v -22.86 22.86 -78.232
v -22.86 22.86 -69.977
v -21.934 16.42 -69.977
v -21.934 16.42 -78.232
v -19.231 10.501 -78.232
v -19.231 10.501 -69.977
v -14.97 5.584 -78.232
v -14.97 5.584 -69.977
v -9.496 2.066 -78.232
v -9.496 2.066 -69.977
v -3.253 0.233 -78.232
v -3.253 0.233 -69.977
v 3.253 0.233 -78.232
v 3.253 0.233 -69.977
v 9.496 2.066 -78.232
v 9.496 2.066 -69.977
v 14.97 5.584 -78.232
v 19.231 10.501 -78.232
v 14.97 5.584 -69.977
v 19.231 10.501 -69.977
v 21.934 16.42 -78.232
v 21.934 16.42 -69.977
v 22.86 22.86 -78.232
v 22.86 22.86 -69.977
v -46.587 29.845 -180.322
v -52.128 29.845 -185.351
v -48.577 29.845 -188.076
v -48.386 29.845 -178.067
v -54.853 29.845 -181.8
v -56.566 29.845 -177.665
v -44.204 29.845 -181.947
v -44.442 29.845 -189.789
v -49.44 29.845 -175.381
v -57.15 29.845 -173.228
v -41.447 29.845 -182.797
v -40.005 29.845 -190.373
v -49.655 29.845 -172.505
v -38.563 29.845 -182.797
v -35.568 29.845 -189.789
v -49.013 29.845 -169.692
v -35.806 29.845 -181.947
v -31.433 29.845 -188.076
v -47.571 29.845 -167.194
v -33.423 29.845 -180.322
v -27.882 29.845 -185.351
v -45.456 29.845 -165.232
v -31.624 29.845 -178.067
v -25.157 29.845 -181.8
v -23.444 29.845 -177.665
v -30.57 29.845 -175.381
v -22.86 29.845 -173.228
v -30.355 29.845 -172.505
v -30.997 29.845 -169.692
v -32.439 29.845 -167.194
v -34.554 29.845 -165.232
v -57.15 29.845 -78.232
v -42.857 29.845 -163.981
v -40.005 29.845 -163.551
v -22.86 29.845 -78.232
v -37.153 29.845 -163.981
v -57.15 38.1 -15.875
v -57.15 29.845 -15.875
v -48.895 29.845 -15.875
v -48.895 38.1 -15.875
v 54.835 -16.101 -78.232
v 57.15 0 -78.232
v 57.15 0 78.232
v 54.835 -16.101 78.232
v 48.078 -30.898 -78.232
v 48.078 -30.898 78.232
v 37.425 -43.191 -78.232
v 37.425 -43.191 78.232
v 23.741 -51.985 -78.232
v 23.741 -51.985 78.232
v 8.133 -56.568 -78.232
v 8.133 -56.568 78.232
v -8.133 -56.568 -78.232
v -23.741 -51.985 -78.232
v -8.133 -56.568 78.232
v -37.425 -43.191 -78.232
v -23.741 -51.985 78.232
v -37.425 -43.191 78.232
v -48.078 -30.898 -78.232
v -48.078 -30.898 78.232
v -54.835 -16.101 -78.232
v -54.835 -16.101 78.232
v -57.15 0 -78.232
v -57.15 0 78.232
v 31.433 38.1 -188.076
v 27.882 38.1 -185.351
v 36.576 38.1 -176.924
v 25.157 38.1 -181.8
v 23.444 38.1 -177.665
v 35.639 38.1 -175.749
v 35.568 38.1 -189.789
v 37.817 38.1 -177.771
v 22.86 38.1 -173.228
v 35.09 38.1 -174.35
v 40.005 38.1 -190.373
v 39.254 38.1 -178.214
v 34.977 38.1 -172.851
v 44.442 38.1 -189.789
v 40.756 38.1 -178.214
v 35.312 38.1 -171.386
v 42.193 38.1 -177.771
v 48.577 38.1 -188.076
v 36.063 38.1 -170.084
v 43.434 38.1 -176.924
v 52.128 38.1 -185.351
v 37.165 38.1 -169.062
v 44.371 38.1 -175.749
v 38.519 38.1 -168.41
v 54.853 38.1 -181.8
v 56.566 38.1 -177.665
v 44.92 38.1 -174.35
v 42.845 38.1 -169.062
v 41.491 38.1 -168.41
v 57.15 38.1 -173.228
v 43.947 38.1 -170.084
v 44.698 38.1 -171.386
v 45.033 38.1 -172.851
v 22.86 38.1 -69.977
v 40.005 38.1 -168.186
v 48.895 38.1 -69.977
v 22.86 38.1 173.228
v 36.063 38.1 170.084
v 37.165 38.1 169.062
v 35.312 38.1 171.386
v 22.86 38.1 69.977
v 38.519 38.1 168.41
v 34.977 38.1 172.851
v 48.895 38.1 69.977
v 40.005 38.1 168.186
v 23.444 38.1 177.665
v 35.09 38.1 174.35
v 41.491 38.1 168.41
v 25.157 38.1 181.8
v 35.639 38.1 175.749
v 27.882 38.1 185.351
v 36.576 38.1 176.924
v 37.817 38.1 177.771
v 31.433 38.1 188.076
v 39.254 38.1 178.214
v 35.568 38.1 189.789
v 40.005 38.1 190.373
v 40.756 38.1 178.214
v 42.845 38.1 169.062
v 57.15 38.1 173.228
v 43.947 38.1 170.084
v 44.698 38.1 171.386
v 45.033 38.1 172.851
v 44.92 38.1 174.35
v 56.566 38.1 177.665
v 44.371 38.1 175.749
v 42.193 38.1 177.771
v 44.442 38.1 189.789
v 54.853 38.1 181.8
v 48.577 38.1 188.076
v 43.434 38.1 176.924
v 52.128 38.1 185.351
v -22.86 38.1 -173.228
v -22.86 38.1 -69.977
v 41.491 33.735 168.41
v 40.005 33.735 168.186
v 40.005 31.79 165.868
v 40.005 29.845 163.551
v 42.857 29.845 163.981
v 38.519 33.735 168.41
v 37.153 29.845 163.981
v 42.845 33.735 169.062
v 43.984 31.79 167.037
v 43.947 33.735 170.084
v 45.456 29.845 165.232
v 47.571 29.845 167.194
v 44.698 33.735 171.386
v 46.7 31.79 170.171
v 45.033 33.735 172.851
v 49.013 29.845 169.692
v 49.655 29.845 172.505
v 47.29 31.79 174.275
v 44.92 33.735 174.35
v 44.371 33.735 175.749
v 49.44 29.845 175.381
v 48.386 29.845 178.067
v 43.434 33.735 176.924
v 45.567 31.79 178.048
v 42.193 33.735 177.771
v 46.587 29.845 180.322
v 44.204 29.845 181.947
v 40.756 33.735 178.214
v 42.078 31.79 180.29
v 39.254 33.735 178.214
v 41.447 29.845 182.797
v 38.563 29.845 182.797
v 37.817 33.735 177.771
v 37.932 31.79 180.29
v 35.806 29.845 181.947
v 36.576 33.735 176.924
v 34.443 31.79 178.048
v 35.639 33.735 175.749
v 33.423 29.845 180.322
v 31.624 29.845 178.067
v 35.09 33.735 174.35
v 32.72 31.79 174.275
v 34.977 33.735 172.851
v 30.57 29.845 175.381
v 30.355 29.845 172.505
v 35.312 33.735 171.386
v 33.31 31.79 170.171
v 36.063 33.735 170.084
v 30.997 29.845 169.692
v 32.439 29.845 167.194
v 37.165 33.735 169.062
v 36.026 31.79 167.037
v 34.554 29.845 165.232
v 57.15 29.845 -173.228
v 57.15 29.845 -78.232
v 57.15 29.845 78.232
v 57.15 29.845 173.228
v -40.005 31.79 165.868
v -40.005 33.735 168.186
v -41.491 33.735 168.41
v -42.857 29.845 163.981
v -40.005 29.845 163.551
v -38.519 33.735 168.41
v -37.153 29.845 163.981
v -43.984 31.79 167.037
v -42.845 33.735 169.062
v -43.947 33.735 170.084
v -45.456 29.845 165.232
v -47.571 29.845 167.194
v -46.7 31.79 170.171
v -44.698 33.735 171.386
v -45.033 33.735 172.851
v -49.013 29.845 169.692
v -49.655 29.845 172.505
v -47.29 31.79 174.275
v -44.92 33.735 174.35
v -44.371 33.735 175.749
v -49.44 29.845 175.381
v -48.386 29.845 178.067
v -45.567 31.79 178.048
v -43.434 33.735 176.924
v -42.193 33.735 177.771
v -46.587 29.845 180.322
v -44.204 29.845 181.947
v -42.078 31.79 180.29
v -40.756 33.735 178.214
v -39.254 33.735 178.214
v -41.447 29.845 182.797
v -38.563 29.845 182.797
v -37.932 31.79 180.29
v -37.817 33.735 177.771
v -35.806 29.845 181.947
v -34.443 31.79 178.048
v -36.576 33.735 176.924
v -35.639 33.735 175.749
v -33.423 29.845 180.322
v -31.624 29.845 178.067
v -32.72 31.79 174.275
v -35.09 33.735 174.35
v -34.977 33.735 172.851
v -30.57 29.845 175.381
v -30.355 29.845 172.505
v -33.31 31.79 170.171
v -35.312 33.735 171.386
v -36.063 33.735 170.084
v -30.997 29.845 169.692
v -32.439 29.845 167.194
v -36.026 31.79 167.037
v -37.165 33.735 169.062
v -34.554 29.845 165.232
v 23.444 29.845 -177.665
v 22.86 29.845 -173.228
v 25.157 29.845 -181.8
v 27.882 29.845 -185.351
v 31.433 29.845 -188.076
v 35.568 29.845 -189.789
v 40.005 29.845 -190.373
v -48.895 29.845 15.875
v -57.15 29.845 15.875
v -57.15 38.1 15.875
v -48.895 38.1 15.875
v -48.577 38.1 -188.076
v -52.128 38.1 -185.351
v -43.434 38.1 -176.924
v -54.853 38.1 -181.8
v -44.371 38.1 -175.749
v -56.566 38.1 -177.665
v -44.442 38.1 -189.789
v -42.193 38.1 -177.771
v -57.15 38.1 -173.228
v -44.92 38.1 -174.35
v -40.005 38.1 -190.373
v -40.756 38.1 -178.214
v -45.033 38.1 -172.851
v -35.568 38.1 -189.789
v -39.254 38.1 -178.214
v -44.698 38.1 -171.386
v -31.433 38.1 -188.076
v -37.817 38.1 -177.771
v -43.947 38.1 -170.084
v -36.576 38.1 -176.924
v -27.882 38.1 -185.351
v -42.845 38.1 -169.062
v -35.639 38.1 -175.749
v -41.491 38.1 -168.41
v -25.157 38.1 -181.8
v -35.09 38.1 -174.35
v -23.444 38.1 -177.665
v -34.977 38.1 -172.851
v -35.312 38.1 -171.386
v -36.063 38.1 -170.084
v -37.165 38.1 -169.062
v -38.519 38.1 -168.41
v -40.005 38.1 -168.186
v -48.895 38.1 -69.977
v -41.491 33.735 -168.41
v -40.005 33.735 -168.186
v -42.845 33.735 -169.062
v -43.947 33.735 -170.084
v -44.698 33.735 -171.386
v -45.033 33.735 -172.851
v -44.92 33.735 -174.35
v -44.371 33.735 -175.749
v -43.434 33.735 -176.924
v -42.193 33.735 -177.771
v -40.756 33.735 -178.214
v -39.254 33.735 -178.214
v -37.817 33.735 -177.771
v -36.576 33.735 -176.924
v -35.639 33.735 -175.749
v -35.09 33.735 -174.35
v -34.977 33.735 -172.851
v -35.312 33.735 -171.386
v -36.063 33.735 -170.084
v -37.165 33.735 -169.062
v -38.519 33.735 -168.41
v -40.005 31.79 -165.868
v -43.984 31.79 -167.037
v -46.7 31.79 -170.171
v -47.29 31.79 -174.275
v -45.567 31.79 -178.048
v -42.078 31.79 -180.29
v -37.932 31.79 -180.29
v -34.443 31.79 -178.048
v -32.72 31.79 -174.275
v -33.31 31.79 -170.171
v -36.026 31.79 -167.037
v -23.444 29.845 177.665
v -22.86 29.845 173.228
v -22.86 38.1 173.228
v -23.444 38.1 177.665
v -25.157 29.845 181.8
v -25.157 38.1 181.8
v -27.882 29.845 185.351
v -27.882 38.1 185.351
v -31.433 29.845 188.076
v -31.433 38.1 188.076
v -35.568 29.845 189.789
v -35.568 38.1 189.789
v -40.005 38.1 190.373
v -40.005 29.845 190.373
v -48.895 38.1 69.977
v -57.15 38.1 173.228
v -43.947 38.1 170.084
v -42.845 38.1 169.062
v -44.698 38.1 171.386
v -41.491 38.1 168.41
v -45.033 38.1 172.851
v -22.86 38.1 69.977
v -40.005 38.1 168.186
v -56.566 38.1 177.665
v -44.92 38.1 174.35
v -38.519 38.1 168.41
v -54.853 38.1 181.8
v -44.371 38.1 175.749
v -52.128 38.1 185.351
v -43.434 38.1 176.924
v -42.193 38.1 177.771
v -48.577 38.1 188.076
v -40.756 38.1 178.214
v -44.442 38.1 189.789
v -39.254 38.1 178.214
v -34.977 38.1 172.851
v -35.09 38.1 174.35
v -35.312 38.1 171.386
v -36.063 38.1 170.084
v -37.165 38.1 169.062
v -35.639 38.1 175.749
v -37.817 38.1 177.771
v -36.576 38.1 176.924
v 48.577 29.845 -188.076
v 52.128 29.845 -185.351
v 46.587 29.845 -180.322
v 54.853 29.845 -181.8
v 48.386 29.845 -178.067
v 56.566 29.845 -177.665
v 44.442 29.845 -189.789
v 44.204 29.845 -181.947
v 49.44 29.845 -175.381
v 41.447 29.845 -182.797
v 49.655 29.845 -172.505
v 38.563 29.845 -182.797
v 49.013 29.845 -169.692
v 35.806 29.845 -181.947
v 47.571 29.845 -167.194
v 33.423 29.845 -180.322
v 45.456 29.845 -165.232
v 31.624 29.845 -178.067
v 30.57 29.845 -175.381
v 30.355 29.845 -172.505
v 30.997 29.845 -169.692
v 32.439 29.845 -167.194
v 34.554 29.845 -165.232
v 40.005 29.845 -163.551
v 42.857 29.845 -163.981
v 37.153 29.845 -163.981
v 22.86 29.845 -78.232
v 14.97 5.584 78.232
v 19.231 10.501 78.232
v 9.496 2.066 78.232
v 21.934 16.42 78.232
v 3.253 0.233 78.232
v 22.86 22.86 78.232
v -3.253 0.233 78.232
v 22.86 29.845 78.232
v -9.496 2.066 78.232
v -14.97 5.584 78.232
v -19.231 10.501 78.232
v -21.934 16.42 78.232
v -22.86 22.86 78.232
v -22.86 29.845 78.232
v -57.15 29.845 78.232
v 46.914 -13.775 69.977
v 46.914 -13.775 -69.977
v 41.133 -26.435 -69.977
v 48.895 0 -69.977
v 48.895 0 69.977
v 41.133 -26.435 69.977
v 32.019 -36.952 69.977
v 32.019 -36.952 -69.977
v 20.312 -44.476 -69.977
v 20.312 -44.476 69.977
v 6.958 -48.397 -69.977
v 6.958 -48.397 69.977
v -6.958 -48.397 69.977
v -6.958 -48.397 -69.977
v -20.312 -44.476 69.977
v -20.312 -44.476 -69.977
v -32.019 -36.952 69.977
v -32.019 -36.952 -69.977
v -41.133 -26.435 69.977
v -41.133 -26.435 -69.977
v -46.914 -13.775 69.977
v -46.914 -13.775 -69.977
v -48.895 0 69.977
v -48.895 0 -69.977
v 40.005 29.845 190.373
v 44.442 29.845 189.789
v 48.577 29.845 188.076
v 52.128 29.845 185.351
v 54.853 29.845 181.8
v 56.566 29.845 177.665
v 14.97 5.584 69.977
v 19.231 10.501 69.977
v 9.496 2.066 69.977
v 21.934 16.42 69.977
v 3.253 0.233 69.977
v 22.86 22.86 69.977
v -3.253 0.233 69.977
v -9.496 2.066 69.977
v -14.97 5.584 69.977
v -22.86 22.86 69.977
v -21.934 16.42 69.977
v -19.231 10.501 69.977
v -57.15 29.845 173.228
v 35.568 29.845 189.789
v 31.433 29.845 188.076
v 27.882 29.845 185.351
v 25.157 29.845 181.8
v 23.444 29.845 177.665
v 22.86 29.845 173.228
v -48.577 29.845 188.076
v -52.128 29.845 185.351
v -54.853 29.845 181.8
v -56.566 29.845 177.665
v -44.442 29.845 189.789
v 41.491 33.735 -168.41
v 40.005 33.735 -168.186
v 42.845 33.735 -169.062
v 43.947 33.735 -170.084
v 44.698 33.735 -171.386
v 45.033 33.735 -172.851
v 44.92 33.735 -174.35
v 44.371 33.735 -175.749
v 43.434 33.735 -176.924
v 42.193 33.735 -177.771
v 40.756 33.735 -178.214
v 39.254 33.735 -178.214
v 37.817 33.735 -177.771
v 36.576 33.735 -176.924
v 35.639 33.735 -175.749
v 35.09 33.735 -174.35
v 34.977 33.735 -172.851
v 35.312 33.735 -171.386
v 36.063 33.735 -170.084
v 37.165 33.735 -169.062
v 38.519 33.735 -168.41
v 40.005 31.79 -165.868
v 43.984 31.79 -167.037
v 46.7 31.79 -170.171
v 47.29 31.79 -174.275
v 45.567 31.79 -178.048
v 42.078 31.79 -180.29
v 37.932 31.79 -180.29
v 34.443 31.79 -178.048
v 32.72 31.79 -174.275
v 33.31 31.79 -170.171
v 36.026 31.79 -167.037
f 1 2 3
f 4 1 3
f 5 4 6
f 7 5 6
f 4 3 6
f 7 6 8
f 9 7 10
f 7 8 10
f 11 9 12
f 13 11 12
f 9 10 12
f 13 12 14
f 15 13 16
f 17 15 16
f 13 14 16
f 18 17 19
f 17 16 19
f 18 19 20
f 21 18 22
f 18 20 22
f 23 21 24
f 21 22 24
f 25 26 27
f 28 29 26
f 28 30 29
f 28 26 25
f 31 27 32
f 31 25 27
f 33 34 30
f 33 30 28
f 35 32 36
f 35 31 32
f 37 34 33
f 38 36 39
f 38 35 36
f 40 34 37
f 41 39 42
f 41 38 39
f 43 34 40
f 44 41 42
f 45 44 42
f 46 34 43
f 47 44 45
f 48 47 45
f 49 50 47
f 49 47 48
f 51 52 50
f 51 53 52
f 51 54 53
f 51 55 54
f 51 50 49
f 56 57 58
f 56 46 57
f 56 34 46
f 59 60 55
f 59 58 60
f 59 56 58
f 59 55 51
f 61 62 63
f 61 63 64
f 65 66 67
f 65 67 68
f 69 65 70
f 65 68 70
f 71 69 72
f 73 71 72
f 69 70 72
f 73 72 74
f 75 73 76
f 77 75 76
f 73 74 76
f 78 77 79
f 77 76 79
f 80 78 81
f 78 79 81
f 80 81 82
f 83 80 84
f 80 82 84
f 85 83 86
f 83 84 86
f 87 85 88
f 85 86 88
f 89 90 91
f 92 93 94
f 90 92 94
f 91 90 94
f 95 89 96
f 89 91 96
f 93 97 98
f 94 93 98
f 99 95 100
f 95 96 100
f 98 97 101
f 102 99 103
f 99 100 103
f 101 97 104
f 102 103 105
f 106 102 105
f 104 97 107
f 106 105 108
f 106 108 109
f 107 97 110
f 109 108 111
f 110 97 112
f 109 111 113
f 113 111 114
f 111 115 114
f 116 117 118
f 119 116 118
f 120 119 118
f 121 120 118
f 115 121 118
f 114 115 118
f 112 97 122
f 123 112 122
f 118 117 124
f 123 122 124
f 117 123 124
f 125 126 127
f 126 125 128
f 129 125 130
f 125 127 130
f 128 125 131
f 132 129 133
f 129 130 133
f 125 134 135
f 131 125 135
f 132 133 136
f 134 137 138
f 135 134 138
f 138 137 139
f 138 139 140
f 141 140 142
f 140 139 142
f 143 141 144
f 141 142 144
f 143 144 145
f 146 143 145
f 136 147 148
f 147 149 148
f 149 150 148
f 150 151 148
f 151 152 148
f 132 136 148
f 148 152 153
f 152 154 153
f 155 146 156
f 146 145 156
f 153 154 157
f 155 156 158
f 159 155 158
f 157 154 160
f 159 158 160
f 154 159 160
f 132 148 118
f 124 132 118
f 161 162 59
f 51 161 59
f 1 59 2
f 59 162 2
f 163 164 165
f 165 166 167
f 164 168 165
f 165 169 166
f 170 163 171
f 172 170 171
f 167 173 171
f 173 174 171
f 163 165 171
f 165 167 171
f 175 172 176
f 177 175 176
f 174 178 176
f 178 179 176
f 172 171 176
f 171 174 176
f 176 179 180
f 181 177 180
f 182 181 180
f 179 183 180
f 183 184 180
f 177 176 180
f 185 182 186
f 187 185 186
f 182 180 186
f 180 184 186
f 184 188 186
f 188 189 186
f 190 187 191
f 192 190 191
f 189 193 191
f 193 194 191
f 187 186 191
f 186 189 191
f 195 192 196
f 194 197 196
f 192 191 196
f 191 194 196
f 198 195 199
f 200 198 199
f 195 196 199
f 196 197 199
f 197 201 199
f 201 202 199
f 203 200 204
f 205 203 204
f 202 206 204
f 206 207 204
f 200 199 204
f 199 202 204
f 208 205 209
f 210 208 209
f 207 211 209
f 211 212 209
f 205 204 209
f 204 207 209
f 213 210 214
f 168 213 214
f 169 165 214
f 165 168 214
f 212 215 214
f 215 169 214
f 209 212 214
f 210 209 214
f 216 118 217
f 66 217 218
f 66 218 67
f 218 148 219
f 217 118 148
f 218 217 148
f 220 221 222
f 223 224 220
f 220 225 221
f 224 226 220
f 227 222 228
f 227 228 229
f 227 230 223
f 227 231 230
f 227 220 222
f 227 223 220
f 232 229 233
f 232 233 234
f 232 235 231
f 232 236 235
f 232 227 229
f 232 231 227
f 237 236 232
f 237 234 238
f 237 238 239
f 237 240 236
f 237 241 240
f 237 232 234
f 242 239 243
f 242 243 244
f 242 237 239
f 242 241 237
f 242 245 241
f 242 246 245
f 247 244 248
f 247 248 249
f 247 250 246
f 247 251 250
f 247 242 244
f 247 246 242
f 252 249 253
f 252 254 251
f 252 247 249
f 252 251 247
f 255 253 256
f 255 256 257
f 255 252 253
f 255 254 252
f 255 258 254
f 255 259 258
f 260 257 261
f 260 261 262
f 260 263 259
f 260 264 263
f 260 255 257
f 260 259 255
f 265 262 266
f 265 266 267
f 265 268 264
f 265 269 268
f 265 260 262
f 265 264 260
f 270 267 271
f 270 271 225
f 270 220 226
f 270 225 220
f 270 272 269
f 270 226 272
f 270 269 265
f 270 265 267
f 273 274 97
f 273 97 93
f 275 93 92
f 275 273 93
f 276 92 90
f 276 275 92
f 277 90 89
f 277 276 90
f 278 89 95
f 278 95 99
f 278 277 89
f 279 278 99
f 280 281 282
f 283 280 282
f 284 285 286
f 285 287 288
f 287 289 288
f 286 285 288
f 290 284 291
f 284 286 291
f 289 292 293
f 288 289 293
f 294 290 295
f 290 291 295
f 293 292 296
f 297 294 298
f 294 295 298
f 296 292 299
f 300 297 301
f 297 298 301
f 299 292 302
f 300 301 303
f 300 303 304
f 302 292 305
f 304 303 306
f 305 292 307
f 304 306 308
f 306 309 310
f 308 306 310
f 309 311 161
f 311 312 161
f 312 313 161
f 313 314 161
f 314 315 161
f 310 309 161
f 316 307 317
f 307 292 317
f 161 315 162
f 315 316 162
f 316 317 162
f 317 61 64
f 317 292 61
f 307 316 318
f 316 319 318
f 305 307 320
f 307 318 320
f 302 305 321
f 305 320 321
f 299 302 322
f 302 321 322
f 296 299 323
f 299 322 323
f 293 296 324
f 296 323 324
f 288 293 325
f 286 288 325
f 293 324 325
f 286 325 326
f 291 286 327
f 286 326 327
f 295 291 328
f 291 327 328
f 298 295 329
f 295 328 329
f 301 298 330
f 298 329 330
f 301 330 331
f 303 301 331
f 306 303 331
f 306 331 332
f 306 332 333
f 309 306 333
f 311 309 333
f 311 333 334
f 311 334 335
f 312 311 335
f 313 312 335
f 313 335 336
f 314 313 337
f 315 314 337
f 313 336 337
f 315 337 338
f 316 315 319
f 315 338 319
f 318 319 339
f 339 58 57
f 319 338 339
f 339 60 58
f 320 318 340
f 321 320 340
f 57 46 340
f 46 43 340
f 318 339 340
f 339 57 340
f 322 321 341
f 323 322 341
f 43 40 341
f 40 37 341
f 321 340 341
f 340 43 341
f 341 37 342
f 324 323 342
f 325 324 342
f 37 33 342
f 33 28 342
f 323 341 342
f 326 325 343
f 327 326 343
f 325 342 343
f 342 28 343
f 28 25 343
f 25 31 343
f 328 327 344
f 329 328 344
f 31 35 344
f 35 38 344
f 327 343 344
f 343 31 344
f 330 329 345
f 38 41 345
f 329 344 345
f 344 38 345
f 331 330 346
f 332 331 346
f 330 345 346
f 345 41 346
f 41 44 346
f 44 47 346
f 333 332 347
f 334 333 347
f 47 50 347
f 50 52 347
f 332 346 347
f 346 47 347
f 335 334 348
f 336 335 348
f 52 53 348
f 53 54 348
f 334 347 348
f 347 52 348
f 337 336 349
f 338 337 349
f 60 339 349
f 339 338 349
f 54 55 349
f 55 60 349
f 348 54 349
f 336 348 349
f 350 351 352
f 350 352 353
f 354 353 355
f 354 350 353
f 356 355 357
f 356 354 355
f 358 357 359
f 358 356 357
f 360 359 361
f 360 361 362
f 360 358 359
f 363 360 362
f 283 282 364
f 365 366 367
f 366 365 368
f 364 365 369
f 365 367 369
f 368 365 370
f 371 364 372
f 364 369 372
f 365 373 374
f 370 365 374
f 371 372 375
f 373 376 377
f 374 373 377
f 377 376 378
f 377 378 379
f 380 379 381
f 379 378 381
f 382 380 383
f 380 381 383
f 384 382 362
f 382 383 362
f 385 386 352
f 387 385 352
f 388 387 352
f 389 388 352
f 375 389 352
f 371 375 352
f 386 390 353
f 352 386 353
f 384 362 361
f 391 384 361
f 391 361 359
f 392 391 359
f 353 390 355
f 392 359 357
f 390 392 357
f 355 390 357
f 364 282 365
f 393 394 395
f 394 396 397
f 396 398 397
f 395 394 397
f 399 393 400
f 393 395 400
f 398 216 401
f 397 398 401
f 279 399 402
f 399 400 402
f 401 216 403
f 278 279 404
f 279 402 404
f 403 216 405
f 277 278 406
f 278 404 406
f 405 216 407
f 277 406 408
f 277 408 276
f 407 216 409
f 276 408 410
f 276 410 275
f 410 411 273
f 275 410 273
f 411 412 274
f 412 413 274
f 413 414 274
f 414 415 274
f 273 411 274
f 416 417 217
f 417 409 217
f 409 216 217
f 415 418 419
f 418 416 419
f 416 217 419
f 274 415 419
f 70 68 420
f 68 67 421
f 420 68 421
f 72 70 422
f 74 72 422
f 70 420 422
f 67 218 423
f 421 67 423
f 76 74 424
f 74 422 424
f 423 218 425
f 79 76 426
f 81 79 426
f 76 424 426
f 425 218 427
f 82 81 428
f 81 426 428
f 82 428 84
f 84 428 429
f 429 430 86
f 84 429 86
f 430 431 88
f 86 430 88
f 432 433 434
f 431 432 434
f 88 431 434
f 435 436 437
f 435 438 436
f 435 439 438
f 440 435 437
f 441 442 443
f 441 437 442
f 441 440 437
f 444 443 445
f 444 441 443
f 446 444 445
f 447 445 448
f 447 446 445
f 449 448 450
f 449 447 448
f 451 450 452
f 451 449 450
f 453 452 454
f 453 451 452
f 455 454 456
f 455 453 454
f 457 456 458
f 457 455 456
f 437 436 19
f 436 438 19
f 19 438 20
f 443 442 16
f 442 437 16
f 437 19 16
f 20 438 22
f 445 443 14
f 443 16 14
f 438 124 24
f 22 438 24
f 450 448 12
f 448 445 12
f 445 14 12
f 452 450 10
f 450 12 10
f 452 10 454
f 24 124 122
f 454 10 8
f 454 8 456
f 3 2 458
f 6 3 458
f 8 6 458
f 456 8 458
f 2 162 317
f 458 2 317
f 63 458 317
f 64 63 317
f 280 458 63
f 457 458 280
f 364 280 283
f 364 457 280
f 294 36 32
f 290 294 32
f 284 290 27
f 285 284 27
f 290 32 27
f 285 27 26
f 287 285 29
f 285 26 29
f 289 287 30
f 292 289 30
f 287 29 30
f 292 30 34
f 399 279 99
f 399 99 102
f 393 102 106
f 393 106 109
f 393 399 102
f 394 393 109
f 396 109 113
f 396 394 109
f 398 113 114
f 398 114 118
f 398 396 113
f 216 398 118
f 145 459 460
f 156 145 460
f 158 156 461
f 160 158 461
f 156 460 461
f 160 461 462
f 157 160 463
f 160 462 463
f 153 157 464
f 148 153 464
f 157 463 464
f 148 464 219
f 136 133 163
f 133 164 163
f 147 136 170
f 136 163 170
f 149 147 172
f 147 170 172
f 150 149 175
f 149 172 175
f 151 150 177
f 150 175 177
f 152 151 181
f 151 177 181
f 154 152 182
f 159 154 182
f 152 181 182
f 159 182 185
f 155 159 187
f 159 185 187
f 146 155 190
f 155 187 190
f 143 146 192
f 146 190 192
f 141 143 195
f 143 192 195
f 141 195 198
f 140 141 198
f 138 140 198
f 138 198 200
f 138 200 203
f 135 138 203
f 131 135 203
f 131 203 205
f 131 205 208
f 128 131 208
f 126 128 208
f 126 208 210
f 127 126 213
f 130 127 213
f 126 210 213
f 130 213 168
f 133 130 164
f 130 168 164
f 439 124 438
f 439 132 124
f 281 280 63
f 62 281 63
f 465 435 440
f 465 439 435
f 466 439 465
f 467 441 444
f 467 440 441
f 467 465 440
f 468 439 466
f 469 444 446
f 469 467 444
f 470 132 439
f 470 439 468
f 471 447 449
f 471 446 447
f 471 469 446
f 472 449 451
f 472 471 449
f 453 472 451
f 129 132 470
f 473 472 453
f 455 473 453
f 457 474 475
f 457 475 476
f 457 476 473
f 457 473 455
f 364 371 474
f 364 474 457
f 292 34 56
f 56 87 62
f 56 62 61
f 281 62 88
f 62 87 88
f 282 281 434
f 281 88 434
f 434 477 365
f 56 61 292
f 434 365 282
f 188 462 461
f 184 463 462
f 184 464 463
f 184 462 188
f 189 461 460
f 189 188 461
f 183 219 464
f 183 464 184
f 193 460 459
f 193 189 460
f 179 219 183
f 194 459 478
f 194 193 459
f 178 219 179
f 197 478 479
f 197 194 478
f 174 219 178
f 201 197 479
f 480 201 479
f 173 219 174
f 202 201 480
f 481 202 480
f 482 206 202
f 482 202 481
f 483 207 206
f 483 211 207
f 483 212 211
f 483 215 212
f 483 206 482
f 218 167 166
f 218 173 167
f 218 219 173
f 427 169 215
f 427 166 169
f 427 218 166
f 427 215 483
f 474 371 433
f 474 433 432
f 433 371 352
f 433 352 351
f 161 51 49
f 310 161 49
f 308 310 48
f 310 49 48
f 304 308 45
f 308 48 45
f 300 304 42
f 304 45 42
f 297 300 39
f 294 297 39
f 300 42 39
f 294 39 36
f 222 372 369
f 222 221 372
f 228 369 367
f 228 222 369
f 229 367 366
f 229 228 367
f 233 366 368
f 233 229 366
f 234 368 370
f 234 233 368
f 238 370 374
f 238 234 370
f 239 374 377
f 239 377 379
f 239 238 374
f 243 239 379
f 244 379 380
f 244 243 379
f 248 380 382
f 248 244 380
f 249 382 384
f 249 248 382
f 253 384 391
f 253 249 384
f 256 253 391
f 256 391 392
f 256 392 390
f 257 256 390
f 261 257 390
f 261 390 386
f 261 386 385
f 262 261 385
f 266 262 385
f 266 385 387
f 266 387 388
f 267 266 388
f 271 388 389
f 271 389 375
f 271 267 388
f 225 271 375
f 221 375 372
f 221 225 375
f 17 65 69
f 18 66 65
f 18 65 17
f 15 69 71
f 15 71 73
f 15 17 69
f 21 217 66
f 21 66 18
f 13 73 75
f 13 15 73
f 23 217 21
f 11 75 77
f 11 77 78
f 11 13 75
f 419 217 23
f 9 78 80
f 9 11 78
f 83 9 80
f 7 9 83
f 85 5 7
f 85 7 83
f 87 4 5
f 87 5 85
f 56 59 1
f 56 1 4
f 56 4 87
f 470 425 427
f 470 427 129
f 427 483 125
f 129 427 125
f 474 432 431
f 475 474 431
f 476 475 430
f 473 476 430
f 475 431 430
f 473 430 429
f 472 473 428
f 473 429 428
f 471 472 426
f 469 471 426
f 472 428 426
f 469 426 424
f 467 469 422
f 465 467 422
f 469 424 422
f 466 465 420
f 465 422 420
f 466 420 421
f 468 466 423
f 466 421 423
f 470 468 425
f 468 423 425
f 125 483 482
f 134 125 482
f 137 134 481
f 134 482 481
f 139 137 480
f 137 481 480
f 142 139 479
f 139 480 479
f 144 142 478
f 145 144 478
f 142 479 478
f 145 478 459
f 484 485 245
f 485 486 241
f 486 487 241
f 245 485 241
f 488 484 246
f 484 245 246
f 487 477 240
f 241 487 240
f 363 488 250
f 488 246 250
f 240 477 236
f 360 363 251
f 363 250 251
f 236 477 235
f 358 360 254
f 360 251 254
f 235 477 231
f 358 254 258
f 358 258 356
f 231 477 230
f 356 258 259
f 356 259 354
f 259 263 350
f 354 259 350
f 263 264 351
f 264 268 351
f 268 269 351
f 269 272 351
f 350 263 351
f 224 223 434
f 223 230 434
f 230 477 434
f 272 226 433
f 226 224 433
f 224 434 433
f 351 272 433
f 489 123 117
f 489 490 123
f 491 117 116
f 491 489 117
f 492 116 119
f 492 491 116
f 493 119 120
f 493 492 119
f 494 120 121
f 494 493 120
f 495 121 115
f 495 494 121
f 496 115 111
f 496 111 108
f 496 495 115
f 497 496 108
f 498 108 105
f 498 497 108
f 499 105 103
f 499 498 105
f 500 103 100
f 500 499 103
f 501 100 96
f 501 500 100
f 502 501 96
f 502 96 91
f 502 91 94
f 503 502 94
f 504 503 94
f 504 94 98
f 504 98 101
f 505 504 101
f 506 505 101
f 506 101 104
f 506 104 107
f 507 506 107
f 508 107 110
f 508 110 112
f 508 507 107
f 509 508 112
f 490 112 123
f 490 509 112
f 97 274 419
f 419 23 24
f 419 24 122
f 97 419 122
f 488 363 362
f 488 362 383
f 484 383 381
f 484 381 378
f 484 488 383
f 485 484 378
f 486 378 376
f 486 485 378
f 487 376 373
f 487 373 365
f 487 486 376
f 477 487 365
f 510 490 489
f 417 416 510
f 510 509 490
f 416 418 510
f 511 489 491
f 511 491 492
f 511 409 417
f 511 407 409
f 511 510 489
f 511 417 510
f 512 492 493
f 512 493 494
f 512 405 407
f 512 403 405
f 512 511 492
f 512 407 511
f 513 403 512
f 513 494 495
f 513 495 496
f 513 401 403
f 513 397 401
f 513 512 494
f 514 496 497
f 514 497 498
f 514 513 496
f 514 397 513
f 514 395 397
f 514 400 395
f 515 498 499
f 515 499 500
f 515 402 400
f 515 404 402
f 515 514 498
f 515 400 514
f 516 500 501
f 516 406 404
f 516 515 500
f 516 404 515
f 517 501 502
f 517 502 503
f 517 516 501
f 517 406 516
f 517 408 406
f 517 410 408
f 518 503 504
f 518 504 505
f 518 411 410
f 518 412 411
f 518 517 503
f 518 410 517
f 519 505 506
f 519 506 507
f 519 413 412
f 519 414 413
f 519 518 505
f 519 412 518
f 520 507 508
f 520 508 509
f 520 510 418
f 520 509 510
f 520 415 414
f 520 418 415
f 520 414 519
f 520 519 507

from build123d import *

# Parameters (mm, degrees)
BOSS_EXTRUDE2_DEPTH = 78.232
SHELL1_T            = -8.255
SKETCH2_W           = 31.75
SKETCH2_H           = 8.255
CUT_EXTRUDE1_DEPTH  = 8.255
SKETCH3_W           = 34.29
SKETCH3_H           = 8.255
BOSS_EXTRUDE3_DEPTH = 112.141
CUT_EXTRUDE2_START  = -8.255
CUT_EXTRUDE2_DEPTH  = 8.255


# Read off the part's stored shape, not the designer's step: Cut-Extrude2
with BuildPart() as part:
    # Sketch1 → Boss-Extrude2 (new, symmetric)
    with BuildSketch(Plane.XY):
        with BuildLine():
            Line((22.86, 38.1), (57.15, 38.1))
            Line((57.15, 38.1), (57.15, 0))
            ThreePointArc((57.15, 0), (0, -57.15), (-57.15, 0))
            Line((-57.15, 0), (-57.15, 38.1))
            Line((-57.15, 38.1), (-22.86, 38.1))
            Line((-22.86, 38.1), (-22.86, 22.86))
            ThreePointArc((-22.86, 22.86), (0, 0), (22.86, 22.86))
            Line((22.86, 22.86), (22.86, 38.1))
        make_face()
    extrude(amount=BOSS_EXTRUDE2_DEPTH, both=True)

    # Shell1
    shell1_openings = [part.faces().sort_by_distance(p)[0] for p in [
        (40.005, 38.1, 0),
        (-40.005, 38.1, 0),
        (-22.86, 30.48, 0),
        (0, 0, 0),
        (22.86, 30.48, 0),
    ]]
    offset(amount=SHELL1_T, openings=shell1_openings, kind=Kind.INTERSECTION)

    # Sketch2 → Cut-Extrude1 (cut)
    with BuildSketch(Plane(origin=(-48.895, 0, 0), x_dir=(0, 0, -1), z_dir=(1, 0, 0))):
        with Locations((0, 33.9725)):
            Rectangle(SKETCH2_W, SKETCH2_H)
    extrude(amount=-CUT_EXTRUDE1_DEPTH, mode=Mode.SUBTRACT)


with BuildPart() as body_2:
    # Sketch3 → Boss-Extrude3 (new body)
    with BuildSketch(Plane.XY.offset(78.232)):
        with Locations((-40.005, 33.9725)):
            Rectangle(SKETCH3_W, SKETCH3_H)
    extrude(amount=BOSS_EXTRUDE3_DEPTH)

    # Cut-Extrude2 outline → Cut-Extrude2 (cut)
    with BuildSketch(Plane(origin=(0, 38.1, 0), x_dir=(1, 0, 0), z_dir=(0, 1, 0)).offset(CUT_EXTRUDE2_START)):
        with BuildLine():
            Line((-22.86, -190.373), (-22.86, -173.228))
            ThreePointArc((-22.86, -173.228), (-27.881654237, -185.351345763), (-40.005, -190.373))
            Line((-40.005, -190.373), (-22.86, -190.373))
        make_face()
        with BuildLine():
            Line((-57.15, -190.373), (-40.005, -190.373))
            ThreePointArc((-40.005, -190.373), (-52.128345763, -185.351345763), (-57.15, -173.228))
            Line((-57.15, -173.228), (-57.15, -190.373))
        make_face()
    extrude(amount=CUT_EXTRUDE2_DEPTH, mode=Mode.SUBTRACT)

    # Sketch7 → CSK for 3/8 Flat Head Machine Screw (100)1 (revolve, cut)
    with BuildSketch(Plane(origin=(-40.005, 29.845, 173.228), x_dir=(0, 0, -1), z_dir=(1, 0, 0))):
        Polygon((0, 0), (0, 8.255), (5.0419, 8.255), (5.0419, 3.88964634), (9.6774, 0), align=None)
    revolve(axis=Axis((-40.005, 23.495, 173.228), (0, 1, 0)), mode=Mode.SUBTRACT)


with BuildPart() as body_3:
    # Mirror2: mirrored copy
    add(body_2.part.mirror(Plane(origin=(0, 0, 0), x_dir=(0, 0, 1), z_dir=(1, 0, 0))))


with BuildPart() as body_4:
    # Mirror3: mirrored copy
    add(body_2.part.mirror(Plane.XY))


with BuildPart() as body_5:
    # Mirror3 2: mirrored copy
    add(body_3.part.mirror(Plane.XY))


with BuildPart() as body_2_1:
    add(body_2.part)

    # Combine2: union body 3, body 4, body 5, part
    add(body_3.part)
    add(body_4.part)
    add(body_5.part)
    add(part.part)


solid = body_2_1.part
